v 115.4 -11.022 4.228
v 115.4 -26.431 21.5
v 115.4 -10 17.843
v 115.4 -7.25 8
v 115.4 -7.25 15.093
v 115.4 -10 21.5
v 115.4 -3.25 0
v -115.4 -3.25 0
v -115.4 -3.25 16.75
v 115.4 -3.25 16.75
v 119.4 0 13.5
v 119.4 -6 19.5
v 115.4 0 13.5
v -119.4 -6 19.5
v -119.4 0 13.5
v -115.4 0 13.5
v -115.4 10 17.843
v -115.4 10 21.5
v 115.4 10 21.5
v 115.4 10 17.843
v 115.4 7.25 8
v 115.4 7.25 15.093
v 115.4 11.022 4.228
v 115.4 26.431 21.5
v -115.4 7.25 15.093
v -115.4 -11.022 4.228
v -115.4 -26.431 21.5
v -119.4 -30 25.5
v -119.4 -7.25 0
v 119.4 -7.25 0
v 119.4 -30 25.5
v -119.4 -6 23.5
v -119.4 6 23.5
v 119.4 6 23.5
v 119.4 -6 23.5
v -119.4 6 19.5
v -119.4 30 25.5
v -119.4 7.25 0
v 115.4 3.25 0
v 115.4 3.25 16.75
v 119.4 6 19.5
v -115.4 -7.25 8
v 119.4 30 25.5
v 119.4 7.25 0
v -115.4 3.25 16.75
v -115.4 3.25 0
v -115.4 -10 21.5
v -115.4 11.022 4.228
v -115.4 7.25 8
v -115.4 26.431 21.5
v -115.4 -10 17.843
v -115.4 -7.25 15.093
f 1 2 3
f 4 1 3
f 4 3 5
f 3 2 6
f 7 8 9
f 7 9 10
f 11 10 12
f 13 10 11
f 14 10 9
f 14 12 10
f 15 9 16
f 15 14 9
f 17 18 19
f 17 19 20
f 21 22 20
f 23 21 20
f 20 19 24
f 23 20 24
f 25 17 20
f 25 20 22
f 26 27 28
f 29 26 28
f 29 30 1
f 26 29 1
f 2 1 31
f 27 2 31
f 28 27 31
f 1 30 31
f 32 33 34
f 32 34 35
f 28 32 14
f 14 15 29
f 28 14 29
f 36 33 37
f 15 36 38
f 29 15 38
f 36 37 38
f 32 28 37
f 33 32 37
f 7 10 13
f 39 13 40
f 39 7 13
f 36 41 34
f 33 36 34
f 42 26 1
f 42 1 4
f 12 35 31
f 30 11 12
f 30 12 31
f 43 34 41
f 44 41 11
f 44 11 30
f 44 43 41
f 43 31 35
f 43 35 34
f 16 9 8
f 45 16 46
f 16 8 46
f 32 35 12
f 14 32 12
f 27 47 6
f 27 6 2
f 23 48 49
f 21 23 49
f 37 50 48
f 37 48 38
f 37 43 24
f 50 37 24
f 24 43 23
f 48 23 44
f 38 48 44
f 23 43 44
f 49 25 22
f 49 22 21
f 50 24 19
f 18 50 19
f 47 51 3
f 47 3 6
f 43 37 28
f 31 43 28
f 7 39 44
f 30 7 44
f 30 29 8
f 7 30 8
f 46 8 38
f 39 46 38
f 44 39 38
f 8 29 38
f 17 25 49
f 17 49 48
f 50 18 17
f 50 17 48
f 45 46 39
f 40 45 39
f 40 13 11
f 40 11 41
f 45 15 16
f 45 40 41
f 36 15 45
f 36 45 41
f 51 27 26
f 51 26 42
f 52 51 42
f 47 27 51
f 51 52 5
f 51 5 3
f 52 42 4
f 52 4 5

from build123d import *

# Parameters (mm, degrees)
BOSS_EXTRUDE1_DEPTH      = 119.4
BOSS_EXTRUDE1_DEPTH_BACK = 119.4
SKETCH1_W                = 230.8
SKETCH1_H                = 6.5
CUT_EXTRUDE1_DEPTH       = 20
SHELL1_START             = -115.4
SHELL1_DEPTH             = 230.8
CHAMFER1_SIZE            = 4


# Read off the part's stored shape, not the designer's step: Shell1
with BuildPart() as part:
    # Sketch4 → Boss-Extrude1 (new, two sides: drawn at the far end of the back side and taken through both)
    with BuildSketch(Plane(origin=(0, 0, 0), x_dir=(0, 0, -1), z_dir=(1, 0, 0)).offset(-BOSS_EXTRUDE1_DEPTH_BACK)):
        Polygon((0, 7.25), (-25.5, 30), (-25.5, -30), (0, -7.25), align=None)
        Polygon((-23.5, 6), (-23.5, -6), (-19.5, -6), (-13.5, 0), (-19.5, 6), align=None, mode=Mode.SUBTRACT)
    extrude(amount=BOSS_EXTRUDE1_DEPTH + BOSS_EXTRUDE1_DEPTH_BACK)

    # Sketch1 → Cut-Extrude1 (cut)
    with BuildSketch(Plane.XY):
        Rectangle(SKETCH1_W, SKETCH1_H)
    extrude(amount=CUT_EXTRUDE1_DEPTH, mode=Mode.SUBTRACT)

    # Shell1 outline → Shell1 (cut)
    with BuildSketch(Plane.YZ.offset(SHELL1_START)):
        Polygon((-10, 21.5), (-26.431372549, 21.5), (-10.818627451, 4), (-7.25, 4), (-7.25, 15.093145751), (-10, 17.843145751), align=None)
        Polygon((26.431372549, 21.5), (10, 21.5), (10, 17.843145751), (7.25, 15.093145751), (7.25, 4), (10.818627451, 4), align=None)
    extrude(amount=SHELL1_DEPTH, mode=Mode.SUBTRACT)

    # Chamfer1
    # the kernel refuses this chamfer: 4 mm, written as the material it adds along each edge
    with BuildSketch(Plane(origin=(-115.4, -7.25, 4), x_dir=(0, -0.9996219169112968, -0.02749587661058638), z_dir=(1, 0, 0))) as chamfer1_piece_1_section:
        Polygon((CHAMFER1_SIZE * 0.999621916911, -CHAMFER1_SIZE * 0.0274958766106), (-CHAMFER1_SIZE * 0.0274958766106, -CHAMFER1_SIZE * 0.999621916911), (0, 0), align=None)
    chamfer1_piece_1 = extrude(amount=230.8, mode=Mode.PRIVATE)
    chamfer1_piece_1 = split(chamfer1_piece_1, bisect_by=Plane(origin=(0, -10.469830587, 3.609040878), z_dir=(0, 0.7461972096049123, 0.6657249615102642)), keep=Keep.TOP, mode=Mode.PRIVATE)
    add(chamfer1_piece_1)
    with BuildSketch(Plane(origin=(-115.4, 7.25, 4), x_dir=(0, 0.9996219169112968, -0.02749587661058638), z_dir=(1, 0, 0))) as chamfer1_piece_2_section:
        Polygon((CHAMFER1_SIZE * 0.999621916911, CHAMFER1_SIZE * 0.0274958766106), (-CHAMFER1_SIZE * 0.0274958766106, CHAMFER1_SIZE * 0.999621916911), (0, 0), align=None)
    chamfer1_piece_2 = extrude(amount=230.8, mode=Mode.PRIVATE)
    chamfer1_piece_2 = split(chamfer1_piece_2, bisect_by=Plane(origin=(0, 10.469830587, 3.609040878), z_dir=(0, -0.7461972096049116, 0.6657249615102648)), keep=Keep.TOP, mode=Mode.PRIVATE)
    add(chamfer1_piece_2)


solid = part.part
